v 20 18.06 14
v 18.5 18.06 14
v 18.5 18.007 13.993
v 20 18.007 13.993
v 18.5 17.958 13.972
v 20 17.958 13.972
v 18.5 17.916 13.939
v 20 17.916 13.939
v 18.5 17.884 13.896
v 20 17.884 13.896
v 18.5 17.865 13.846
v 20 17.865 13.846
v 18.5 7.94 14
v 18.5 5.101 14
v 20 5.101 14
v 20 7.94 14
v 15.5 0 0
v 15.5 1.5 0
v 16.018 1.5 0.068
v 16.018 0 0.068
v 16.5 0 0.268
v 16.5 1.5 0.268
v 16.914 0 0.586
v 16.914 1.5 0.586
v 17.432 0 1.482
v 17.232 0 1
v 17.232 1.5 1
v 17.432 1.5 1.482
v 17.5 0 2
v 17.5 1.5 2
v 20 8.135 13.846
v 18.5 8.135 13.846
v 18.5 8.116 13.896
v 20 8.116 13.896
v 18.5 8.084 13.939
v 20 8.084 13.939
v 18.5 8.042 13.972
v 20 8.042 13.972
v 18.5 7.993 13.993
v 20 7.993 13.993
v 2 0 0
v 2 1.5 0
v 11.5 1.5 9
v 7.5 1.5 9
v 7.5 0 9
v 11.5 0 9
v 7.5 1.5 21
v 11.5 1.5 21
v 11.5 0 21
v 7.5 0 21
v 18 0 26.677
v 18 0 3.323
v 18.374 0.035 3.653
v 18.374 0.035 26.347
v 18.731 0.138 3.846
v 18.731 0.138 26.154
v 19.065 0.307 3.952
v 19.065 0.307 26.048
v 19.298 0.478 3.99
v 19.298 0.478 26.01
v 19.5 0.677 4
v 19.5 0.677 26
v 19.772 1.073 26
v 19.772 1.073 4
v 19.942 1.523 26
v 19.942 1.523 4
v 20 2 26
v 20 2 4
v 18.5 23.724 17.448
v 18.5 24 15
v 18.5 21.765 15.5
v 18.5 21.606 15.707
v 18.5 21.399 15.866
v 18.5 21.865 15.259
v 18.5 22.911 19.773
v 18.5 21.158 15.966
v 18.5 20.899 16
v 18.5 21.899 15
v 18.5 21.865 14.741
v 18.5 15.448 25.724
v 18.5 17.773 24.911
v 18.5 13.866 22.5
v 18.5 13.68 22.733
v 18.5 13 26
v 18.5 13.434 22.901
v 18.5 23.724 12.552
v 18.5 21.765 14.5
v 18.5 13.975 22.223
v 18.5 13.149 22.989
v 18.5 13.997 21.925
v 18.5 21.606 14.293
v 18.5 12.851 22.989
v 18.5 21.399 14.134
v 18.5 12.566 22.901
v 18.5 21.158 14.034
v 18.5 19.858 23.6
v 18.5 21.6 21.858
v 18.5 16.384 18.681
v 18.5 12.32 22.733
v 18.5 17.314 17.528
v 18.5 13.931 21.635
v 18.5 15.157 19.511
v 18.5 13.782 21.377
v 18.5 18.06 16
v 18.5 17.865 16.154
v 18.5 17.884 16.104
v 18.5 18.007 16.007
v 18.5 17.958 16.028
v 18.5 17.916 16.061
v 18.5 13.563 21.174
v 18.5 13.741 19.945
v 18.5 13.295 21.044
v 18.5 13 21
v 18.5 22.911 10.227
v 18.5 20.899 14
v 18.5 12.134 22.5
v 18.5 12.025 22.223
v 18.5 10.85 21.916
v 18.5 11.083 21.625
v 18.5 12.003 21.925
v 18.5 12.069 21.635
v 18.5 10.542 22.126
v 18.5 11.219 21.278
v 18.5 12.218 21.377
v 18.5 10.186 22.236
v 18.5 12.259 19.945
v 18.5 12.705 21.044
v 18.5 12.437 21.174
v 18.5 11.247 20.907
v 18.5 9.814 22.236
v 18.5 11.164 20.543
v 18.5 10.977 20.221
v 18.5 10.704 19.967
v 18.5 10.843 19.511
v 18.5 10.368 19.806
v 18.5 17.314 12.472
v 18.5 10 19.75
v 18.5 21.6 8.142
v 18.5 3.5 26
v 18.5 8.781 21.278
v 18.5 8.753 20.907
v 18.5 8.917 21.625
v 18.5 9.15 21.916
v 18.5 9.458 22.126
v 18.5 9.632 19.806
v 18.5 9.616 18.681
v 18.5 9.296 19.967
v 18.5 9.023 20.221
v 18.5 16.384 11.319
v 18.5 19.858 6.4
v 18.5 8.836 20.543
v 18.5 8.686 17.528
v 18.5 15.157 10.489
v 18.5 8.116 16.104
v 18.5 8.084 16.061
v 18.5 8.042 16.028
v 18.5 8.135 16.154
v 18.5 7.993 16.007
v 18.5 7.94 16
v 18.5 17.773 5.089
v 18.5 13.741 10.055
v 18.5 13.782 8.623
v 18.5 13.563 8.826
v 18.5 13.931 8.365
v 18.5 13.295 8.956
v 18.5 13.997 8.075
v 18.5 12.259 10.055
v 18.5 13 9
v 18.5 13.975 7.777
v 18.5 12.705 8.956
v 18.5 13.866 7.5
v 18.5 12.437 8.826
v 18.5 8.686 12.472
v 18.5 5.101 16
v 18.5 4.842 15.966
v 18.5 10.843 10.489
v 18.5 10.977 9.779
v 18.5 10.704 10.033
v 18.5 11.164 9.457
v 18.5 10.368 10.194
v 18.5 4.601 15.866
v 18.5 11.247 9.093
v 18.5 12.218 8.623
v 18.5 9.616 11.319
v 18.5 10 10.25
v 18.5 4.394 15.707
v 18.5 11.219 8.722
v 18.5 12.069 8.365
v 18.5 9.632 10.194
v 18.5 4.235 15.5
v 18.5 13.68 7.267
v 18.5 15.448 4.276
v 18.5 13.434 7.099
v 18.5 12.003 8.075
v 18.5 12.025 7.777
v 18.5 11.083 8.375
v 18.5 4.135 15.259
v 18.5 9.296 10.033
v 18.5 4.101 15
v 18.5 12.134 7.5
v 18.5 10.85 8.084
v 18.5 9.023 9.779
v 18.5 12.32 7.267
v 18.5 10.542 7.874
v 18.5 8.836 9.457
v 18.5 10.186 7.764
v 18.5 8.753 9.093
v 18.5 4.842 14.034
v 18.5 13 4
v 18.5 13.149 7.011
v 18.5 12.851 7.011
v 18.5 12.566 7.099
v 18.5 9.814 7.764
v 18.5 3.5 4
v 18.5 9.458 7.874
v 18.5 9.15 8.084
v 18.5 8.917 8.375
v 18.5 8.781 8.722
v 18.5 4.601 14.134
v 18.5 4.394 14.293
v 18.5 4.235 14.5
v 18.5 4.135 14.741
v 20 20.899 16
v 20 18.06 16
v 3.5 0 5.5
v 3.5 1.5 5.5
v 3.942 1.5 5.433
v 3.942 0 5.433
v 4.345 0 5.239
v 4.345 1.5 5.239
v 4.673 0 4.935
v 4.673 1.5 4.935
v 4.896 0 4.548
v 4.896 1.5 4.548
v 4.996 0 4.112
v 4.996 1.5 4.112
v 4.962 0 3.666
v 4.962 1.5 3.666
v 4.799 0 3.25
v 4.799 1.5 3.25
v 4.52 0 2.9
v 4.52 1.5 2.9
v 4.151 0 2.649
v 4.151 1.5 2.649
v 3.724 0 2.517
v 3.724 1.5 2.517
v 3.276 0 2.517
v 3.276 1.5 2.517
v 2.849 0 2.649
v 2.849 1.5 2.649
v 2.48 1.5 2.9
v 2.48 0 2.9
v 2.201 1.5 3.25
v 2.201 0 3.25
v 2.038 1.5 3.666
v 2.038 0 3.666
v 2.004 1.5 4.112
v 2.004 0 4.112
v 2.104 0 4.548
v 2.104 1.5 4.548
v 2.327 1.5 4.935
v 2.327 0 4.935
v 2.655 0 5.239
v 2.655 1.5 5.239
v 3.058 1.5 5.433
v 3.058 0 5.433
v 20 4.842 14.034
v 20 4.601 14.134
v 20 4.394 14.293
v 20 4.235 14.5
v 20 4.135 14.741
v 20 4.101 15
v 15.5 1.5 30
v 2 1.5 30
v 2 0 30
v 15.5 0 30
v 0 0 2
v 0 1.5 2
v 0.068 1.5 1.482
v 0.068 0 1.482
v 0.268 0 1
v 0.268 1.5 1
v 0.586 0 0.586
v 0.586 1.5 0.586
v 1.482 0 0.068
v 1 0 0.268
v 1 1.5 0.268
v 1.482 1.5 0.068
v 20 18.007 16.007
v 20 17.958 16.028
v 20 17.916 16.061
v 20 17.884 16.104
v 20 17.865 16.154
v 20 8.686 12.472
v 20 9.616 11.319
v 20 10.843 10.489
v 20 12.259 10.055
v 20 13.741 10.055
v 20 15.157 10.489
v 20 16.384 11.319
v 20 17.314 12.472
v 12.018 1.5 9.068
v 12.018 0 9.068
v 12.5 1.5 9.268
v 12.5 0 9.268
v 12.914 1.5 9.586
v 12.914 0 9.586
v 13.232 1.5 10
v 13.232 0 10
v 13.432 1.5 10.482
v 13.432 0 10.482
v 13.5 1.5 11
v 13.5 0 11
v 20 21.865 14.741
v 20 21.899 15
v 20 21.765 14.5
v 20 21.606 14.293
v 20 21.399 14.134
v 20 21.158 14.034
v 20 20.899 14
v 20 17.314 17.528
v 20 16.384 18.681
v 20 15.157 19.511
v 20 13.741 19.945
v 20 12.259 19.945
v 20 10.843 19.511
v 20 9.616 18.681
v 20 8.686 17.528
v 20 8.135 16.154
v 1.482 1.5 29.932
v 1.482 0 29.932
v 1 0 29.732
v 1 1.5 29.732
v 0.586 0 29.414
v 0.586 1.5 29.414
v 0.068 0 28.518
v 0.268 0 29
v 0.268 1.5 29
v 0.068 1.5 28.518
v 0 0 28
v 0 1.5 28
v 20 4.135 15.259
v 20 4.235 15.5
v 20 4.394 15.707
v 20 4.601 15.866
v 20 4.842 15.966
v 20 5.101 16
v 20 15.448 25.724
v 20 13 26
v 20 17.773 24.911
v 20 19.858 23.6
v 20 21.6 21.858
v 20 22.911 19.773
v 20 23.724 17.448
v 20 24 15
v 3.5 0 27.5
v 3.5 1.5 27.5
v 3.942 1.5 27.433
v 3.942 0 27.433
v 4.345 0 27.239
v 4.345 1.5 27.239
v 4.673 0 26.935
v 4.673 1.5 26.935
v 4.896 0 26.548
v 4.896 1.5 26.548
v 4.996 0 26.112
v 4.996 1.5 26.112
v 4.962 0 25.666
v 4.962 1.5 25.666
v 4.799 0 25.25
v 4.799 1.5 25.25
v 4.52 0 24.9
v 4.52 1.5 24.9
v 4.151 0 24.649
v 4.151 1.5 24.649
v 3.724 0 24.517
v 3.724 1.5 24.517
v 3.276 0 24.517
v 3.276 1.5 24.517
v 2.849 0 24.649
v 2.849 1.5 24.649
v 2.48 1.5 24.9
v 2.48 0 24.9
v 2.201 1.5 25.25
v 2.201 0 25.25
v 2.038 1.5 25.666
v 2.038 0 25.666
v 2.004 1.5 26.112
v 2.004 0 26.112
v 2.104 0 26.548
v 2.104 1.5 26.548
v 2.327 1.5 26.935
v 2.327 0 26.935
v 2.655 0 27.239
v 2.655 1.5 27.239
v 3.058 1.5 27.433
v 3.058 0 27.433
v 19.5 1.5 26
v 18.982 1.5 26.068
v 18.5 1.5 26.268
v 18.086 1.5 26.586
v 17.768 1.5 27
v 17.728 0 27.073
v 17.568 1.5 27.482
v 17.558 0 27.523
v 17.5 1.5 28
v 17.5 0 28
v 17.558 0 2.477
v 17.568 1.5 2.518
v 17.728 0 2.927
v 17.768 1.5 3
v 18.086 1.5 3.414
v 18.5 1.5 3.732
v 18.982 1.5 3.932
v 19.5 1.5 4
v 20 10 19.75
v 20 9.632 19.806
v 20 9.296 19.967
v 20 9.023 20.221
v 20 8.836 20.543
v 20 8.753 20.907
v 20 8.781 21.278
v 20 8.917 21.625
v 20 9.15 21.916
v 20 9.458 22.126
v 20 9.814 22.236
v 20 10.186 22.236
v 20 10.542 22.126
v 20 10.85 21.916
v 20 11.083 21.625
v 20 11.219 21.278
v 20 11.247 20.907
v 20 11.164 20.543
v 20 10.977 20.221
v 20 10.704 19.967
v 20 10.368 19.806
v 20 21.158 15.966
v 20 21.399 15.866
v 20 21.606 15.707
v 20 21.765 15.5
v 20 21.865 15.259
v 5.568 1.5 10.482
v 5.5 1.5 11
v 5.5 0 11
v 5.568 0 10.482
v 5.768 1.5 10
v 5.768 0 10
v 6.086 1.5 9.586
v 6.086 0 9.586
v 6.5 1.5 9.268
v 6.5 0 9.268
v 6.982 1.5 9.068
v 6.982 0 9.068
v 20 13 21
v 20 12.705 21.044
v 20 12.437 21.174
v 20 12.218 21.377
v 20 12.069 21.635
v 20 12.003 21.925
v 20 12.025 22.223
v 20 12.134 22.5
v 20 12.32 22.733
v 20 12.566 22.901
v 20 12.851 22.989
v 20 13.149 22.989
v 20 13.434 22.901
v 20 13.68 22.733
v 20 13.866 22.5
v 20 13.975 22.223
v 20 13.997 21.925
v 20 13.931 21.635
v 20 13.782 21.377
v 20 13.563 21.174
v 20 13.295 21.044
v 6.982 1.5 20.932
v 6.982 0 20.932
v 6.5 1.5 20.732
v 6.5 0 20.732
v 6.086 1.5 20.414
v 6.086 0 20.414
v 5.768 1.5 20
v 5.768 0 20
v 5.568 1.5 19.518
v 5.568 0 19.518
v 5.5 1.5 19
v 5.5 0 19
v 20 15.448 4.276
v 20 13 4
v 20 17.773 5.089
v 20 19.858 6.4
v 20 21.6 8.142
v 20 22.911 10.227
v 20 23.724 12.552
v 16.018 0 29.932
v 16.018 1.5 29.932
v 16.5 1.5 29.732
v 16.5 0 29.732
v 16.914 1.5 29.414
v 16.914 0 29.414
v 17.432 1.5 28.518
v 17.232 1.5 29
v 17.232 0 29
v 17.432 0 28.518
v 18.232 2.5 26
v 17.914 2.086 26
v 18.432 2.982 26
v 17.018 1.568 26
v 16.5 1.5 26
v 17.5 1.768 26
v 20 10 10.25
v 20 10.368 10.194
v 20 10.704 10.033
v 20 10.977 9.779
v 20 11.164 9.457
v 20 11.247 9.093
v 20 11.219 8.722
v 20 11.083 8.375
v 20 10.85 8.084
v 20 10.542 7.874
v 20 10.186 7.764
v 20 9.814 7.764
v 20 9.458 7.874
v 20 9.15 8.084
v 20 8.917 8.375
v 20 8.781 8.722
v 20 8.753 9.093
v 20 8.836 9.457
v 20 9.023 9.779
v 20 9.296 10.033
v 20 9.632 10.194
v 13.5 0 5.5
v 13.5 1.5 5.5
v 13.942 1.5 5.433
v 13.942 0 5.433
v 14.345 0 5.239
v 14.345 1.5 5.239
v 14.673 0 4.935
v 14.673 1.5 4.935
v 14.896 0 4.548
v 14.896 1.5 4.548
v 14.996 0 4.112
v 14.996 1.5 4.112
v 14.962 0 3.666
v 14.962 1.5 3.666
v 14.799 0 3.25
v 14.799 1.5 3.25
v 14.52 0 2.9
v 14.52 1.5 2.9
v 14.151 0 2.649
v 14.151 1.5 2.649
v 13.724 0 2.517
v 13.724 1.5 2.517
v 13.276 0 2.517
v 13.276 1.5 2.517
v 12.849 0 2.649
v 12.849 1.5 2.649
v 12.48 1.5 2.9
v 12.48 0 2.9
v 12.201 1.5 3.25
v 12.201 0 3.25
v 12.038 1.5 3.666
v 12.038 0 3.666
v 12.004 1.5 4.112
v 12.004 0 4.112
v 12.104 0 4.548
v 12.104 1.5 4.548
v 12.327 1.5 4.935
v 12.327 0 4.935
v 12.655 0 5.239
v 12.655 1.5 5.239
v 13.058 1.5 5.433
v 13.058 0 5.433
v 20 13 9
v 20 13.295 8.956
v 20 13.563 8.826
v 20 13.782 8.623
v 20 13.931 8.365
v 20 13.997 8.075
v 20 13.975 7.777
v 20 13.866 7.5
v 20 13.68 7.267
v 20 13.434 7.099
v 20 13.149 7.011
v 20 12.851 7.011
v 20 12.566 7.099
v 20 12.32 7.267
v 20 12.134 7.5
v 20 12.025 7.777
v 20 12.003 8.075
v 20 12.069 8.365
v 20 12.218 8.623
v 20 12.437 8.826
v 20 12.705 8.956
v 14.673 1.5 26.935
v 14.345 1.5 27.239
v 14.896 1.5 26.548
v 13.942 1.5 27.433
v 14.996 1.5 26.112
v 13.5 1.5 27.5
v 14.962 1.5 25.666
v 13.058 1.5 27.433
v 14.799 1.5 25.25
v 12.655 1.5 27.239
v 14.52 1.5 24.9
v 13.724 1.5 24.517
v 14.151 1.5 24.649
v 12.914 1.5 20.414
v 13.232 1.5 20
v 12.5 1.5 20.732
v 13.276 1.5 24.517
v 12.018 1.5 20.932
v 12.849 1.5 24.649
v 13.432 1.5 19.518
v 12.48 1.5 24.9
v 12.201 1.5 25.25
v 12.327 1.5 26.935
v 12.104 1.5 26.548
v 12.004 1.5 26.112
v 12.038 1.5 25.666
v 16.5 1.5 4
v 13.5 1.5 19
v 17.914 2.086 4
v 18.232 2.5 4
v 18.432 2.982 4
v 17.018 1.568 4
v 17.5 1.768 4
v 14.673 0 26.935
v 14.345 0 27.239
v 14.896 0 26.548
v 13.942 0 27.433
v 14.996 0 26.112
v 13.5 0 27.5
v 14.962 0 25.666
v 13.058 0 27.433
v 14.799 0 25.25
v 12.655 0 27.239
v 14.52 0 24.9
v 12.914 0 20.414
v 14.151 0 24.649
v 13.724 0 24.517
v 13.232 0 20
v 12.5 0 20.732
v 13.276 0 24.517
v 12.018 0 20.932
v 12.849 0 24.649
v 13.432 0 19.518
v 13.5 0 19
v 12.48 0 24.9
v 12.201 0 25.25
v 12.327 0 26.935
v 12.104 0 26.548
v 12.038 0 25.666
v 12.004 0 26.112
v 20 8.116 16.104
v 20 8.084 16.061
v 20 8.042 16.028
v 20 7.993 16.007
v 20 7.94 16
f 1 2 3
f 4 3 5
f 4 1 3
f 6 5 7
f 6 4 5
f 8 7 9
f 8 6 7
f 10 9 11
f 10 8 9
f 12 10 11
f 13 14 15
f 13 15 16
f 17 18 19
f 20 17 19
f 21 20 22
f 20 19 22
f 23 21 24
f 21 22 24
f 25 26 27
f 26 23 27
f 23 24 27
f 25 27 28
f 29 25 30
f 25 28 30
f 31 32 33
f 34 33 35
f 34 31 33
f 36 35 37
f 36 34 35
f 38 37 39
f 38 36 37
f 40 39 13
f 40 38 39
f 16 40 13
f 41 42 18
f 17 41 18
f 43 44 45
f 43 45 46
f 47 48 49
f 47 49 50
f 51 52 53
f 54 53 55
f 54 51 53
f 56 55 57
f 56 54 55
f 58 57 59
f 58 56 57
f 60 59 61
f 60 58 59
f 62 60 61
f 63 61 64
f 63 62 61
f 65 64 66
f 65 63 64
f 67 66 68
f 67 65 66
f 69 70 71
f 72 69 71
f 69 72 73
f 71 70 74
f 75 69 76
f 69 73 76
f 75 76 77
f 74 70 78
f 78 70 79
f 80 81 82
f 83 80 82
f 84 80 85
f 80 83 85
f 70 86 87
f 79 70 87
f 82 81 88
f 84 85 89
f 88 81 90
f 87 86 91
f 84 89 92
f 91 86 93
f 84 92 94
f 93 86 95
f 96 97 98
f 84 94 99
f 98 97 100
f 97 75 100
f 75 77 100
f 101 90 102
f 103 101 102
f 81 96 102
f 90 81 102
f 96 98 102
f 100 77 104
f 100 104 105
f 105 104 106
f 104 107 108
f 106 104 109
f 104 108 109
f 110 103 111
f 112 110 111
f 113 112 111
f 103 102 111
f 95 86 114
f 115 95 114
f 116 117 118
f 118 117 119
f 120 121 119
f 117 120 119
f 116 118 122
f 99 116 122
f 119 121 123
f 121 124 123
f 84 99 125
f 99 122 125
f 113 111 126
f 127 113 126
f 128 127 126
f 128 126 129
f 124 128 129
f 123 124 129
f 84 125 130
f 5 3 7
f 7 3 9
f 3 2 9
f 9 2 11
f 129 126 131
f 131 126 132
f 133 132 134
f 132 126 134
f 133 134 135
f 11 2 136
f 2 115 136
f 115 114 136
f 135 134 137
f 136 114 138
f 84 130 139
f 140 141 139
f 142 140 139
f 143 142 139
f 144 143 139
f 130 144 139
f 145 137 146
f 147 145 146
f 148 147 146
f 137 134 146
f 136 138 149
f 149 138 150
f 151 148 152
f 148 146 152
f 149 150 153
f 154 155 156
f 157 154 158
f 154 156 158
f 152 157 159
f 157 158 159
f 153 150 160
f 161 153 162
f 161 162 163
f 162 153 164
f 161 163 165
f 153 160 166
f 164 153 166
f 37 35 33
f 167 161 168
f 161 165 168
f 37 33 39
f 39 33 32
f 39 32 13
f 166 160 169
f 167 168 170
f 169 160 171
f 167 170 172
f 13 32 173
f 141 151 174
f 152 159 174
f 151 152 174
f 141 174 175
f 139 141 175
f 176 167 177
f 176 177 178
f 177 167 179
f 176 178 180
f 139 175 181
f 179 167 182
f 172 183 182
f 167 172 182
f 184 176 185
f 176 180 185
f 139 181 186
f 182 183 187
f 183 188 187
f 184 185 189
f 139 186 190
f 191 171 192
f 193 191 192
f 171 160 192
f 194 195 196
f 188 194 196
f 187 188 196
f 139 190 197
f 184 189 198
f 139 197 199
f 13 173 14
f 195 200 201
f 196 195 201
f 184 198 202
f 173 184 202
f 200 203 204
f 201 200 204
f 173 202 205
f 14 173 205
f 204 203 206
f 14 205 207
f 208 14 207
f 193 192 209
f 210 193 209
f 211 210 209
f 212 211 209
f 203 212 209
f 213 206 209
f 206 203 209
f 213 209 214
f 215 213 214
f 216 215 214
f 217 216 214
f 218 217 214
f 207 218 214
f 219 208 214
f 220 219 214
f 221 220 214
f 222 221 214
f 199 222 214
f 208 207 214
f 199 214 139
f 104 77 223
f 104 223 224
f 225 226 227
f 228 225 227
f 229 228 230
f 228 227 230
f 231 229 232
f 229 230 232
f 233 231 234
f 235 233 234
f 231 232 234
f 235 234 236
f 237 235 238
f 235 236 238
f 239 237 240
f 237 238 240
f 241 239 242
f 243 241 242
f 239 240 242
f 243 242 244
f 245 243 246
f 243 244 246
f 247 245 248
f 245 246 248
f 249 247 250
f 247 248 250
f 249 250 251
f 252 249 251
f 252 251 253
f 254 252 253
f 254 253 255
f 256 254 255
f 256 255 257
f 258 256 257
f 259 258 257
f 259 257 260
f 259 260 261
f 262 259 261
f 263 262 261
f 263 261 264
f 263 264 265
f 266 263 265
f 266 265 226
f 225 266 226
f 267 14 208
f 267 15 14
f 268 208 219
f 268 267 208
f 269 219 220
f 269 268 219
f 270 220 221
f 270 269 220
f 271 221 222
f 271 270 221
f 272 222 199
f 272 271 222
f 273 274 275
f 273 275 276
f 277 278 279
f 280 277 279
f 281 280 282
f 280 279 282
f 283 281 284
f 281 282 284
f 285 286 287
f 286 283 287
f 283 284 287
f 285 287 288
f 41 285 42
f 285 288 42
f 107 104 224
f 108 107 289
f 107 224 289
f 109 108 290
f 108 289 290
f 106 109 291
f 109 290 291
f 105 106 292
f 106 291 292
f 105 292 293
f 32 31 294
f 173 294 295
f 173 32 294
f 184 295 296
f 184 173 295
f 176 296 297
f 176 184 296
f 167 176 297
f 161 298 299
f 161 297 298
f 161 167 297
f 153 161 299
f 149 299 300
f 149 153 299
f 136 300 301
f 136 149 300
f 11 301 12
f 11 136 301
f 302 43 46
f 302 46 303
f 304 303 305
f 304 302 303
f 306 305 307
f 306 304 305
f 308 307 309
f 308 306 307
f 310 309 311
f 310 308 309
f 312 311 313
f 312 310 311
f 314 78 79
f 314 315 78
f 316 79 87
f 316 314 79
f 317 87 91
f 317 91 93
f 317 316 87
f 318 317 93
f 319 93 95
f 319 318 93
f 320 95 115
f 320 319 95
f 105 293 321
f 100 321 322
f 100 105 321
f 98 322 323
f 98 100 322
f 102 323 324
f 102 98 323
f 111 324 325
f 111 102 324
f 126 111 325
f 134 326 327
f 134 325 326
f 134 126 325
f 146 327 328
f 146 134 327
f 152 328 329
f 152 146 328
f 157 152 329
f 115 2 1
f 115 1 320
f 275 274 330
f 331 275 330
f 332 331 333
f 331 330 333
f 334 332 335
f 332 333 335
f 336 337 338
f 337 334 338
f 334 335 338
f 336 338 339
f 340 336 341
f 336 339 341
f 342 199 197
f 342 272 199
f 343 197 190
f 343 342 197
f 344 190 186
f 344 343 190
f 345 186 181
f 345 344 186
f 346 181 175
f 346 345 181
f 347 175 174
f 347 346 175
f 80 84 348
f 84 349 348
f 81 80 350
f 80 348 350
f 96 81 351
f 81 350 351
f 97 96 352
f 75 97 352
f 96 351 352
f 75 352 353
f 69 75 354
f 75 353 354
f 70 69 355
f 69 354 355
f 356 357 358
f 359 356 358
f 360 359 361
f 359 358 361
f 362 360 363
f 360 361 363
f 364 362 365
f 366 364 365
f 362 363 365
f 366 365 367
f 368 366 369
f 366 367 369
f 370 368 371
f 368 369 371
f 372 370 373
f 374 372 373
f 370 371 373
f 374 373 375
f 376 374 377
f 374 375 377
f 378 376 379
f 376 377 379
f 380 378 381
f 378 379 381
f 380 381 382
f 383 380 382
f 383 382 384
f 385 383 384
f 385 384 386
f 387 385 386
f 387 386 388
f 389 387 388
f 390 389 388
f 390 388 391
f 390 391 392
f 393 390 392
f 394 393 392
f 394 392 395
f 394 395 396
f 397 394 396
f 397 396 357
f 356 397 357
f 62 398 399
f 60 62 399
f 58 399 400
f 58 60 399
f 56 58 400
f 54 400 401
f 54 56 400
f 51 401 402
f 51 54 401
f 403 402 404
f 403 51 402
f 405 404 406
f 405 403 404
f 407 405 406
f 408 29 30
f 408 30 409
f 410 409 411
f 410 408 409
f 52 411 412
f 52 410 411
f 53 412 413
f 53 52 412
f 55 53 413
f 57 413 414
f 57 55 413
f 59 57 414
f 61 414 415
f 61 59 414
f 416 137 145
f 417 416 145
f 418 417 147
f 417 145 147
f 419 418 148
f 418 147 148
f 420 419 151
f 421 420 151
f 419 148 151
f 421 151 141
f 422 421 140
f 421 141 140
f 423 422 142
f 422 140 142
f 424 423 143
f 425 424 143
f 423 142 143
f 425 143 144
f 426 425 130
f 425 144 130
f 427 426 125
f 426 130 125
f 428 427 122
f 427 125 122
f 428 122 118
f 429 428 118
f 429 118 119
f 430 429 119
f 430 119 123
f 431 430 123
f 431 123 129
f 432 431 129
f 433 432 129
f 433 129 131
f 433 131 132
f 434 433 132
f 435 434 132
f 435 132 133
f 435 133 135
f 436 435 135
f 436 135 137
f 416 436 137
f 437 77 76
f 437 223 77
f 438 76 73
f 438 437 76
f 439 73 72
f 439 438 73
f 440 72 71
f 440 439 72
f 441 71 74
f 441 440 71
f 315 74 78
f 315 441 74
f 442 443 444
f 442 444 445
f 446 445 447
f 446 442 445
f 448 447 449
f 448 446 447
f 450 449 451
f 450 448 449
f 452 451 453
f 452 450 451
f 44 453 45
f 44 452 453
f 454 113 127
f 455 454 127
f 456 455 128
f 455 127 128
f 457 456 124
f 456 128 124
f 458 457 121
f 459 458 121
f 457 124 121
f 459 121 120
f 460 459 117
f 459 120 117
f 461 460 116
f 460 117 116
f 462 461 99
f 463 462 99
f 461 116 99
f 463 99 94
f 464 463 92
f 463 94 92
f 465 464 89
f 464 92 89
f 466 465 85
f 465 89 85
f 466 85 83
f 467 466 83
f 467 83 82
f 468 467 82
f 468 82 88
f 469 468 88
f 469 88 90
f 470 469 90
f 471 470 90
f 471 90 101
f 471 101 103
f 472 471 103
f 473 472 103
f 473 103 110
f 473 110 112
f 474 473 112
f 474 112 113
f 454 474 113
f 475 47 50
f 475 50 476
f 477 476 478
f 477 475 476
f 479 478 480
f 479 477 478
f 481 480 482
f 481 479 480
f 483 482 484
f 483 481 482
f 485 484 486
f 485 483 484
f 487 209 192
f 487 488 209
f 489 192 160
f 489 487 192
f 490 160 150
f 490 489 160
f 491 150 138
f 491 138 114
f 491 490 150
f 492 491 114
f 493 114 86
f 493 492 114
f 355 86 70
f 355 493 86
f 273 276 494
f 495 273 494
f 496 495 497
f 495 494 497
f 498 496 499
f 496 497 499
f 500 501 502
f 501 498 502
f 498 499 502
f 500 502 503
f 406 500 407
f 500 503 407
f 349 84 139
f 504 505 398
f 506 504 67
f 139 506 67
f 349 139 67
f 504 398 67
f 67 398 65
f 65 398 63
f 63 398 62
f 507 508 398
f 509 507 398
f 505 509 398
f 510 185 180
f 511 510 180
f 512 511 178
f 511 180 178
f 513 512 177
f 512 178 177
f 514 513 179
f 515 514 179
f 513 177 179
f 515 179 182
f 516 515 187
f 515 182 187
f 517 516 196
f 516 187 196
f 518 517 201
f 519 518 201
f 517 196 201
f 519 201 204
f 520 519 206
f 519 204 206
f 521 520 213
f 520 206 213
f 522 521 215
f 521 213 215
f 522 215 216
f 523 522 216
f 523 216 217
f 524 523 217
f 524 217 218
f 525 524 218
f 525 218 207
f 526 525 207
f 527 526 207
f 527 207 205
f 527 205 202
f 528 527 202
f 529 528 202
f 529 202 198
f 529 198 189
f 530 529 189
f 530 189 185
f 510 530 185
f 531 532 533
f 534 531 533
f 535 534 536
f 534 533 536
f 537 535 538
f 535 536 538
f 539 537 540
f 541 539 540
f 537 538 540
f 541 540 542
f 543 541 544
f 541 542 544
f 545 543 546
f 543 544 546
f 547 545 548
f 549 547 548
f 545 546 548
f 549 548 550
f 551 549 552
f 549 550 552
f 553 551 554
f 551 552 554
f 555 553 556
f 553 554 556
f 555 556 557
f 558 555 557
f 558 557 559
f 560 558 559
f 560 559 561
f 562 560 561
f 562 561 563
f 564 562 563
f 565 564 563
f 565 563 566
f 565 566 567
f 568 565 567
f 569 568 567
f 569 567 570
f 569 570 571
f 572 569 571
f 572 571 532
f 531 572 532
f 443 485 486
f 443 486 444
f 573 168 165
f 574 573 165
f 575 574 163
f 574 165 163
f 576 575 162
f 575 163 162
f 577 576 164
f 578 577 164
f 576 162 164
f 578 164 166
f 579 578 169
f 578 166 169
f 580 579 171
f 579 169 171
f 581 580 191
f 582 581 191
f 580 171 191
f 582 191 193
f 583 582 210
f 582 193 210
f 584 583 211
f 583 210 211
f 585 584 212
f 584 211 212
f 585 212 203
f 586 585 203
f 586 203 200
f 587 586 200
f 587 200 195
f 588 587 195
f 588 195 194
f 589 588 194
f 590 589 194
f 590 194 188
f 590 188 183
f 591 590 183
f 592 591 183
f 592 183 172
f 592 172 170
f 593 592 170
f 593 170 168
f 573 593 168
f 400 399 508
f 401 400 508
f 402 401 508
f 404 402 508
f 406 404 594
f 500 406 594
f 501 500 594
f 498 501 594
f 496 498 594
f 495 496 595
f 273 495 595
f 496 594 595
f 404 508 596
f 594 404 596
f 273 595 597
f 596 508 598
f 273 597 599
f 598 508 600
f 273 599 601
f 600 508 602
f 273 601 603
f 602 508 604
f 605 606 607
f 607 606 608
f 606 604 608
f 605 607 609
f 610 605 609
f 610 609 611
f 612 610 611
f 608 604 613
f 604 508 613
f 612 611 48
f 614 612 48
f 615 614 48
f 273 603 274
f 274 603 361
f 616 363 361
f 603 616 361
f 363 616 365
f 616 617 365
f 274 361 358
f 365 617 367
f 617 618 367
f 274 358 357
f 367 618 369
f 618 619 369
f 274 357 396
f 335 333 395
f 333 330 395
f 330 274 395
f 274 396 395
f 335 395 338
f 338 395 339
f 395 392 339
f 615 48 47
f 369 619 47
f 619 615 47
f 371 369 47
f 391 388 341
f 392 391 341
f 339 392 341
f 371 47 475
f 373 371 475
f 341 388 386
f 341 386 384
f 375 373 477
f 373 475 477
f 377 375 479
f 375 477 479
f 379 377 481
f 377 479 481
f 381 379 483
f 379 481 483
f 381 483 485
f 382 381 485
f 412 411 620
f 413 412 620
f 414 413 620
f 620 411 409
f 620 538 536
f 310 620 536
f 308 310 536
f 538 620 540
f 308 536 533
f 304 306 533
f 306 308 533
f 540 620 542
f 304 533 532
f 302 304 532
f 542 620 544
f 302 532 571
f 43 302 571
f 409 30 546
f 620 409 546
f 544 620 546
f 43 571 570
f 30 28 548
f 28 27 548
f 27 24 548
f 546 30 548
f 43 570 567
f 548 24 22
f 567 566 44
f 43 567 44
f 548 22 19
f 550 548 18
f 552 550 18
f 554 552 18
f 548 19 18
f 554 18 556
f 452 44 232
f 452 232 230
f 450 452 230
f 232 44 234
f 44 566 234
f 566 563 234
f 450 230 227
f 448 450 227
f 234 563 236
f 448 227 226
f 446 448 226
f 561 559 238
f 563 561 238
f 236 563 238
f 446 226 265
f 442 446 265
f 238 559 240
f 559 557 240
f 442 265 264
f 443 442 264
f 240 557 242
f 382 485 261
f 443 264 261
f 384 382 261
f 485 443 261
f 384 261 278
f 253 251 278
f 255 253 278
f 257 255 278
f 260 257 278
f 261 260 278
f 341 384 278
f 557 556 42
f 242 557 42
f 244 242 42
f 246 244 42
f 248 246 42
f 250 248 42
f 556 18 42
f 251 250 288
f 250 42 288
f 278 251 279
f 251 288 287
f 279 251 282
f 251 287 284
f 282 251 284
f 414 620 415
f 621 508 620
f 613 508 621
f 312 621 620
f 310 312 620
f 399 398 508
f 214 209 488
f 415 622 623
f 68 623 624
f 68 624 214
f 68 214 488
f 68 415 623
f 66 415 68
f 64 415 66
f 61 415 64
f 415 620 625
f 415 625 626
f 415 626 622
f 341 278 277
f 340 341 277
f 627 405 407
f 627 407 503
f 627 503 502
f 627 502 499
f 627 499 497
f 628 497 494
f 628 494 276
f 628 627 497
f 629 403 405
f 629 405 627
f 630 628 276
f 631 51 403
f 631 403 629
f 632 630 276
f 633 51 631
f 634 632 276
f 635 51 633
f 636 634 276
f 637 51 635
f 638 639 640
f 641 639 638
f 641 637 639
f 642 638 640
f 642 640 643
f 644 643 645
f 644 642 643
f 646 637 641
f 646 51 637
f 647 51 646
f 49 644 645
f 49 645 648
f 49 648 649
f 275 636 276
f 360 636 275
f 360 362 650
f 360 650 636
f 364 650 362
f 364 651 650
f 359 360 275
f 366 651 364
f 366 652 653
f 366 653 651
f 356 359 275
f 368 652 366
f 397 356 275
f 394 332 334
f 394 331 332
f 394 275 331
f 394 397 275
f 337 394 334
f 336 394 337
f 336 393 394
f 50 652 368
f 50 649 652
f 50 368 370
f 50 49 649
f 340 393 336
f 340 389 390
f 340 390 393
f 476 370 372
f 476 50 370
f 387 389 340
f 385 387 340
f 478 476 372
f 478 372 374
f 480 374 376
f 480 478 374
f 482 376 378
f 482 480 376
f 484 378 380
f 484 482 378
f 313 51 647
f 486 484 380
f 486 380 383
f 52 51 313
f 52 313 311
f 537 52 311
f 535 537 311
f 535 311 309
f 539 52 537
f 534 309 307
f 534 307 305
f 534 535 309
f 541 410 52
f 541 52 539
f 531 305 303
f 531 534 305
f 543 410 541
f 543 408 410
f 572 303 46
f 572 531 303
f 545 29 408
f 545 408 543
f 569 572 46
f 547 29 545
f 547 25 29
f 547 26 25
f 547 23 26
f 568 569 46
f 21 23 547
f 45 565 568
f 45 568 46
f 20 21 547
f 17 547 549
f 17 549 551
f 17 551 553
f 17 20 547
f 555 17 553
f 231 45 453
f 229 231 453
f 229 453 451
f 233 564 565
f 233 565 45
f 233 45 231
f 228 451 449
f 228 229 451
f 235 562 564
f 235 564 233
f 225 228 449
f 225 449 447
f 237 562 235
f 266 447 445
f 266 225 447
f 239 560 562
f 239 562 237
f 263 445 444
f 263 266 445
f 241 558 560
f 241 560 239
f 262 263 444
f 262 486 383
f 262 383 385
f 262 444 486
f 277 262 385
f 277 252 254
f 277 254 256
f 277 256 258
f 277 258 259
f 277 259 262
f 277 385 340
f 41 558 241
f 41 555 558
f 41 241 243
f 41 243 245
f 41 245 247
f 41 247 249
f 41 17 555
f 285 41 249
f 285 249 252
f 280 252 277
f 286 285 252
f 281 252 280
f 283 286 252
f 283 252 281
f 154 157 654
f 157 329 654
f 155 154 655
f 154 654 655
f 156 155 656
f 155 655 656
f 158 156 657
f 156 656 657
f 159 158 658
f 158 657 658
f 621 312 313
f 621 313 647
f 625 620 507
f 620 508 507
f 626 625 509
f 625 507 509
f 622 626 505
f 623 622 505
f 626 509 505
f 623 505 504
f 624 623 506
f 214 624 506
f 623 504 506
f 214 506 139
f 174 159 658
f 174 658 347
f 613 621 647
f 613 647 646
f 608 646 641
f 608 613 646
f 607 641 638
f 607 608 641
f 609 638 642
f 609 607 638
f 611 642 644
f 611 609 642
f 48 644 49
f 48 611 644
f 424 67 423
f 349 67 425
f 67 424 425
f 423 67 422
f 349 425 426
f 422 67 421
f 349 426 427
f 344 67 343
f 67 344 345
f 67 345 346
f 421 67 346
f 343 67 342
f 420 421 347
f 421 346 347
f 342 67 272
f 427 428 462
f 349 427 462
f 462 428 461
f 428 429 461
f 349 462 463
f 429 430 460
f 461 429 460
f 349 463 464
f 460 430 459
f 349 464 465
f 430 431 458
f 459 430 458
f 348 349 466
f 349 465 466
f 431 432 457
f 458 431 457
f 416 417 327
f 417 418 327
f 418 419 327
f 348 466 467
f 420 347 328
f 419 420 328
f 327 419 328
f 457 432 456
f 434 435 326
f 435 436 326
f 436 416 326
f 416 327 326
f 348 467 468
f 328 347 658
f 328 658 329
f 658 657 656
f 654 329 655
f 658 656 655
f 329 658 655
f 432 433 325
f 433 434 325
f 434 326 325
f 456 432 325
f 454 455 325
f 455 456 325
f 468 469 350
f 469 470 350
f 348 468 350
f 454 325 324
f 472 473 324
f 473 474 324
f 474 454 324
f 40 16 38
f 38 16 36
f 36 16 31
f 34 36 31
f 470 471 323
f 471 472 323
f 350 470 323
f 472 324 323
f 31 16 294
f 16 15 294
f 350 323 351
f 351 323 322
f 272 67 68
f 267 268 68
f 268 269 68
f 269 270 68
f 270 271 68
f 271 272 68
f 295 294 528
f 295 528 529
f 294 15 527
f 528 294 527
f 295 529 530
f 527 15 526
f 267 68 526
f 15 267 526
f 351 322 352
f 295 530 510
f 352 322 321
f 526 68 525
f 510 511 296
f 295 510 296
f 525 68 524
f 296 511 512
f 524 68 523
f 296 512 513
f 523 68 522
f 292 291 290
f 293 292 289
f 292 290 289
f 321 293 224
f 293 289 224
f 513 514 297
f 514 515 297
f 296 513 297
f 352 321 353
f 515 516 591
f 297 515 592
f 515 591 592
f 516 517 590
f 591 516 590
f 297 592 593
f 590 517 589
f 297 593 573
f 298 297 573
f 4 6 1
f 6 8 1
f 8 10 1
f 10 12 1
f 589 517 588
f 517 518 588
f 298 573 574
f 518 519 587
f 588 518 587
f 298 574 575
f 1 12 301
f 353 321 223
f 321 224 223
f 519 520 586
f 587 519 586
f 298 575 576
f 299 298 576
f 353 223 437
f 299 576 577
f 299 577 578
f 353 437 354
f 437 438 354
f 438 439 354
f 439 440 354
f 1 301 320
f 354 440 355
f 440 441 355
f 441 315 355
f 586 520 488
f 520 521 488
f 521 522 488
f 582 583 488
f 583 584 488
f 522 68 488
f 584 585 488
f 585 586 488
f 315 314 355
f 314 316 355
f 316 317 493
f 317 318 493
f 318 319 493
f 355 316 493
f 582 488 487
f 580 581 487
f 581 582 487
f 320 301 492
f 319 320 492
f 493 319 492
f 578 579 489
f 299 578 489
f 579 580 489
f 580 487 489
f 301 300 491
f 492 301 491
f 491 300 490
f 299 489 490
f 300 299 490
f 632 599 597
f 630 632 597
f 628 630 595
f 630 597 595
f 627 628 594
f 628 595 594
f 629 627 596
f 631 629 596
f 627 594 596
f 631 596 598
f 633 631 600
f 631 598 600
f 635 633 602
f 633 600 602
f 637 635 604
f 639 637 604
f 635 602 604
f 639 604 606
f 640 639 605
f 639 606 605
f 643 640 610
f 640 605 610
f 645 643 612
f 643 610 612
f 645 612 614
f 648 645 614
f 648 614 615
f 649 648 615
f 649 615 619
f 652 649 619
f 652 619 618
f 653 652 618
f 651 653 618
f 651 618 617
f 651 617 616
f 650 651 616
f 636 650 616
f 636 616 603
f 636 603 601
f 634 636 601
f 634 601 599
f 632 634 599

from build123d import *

# Parameters (mm, degrees)
EXTRUDE_1_DEPTH          = 30
CUT_EXTRUDE_1_DEPTH      = 30
CUT_EXTRUDE_1_DEPTH_BACK = 30
SKETCH_2_W               = 4.827470223
SKETCH_2_H               = 5.659354242
FILLET_1_R               = 11
SKETCH_3_R               = 1.5
CUT_EXTRUDE_2_DEPTH      = 30
SKETCH_4_R               = 1
SKETCH_4_R_2             = 1.25
CUT_EXTRUDE_3_DEPTH      = 43.640942766
FILLET_2_R               = 1
FILLET_3_R               = 0.2
FILLET_4_R               = 2
FILLET_5_R               = 2


# Some blends are built 0.0001 mm under size
with BuildPart() as part:
    # 草图1 → 凸台-拉伸1 (new body)
    with BuildSketch(Plane.XY):
        Polygon((0, 0), (18.5, 0), (20, 0), (20, 24), (18.5, 24), (18.5, 1.5), (0, 1.5), align=None)
    extrude(amount=EXTRUDE_1_DEPTH)

    # 草图2 → 切除-拉伸1 (cut, two sides: drawn at the far end of the back side and taken through both)
    with BuildSketch(Plane(origin=(0, 1.5, 0), x_dir=(1, 0, 0), z_dir=(0, 1, 0)).offset(-CUT_EXTRUDE_1_DEPTH_BACK)):
        with Locations((19.913735112, -1.170322879)):
            Rectangle(SKETCH_2_W, SKETCH_2_H)
        with Locations((19.913735112, -28.829677121)):
            Rectangle(SKETCH_2_W, SKETCH_2_H)
    extrude(amount=CUT_EXTRUDE_1_DEPTH + CUT_EXTRUDE_1_DEPTH_BACK, mode=Mode.SUBTRACT)

    # 圆角1
    fillet_1_edges = [part.edges().sort_by_distance(p)[0] for p in [
        (19.25, 24, 26),
        (19.25, 24, 4),
    ]]
    fillet(fillet_1_edges, radius=FILLET_1_R - 0.0001)  # a hair under: the kernel refuses the full size

    # 草图3 → 切除-拉伸2 (cut)
    with BuildSketch(Plane(origin=(0, 1.5, 0), x_dir=(1, 0, 0), z_dir=(0, 1, 0))):
        with Locations(Location((13.5, -4, 0), (0, 0, 270))):
            Circle(SKETCH_3_R)
        with Locations(Location((3.5, -4, 0), (0, 0, 270))):
            Circle(SKETCH_3_R)
        with Locations(Location((3.5, -26, 0), (0, 0, 270))):
            Circle(SKETCH_3_R)
        with Locations(Location((13.5, -26, 0), (0, 0, 270))):
            Circle(SKETCH_3_R)
        with BuildLine():
            Line((7.5, -9), (11.5, -9))
            ThreePointArc((11.5, -9), (12.914213562, -9.585786438), (13.5, -11))
            Line((13.5, -11), (13.5, -19))
            ThreePointArc((13.5, -19), (12.914213562, -20.414213562), (11.5, -21))
            Line((11.5, -21), (7.5, -21))
            ThreePointArc((7.5, -21), (6.085786438, -20.414213562), (5.5, -19))
            Line((5.5, -19), (5.5, -11))
            ThreePointArc((5.5, -11), (6.085786438, -9.585786438), (7.5, -9))
        make_face()
    extrude(amount=-CUT_EXTRUDE_2_DEPTH, mode=Mode.SUBTRACT)

    # 草图4 → 切除-拉伸3 (cut, through all)
    with BuildSketch(Plane.ZY.offset(-18.5)):
        with Locations((8, 13)):
            Circle(SKETCH_4_R)
        with Locations(Location((22, 13, 0), (0, 0, 180))):
            Circle(SKETCH_4_R)
        with Locations((9, 10)):
            Circle(SKETCH_4_R_2)
        with Locations(Location((21, 10, 0), (0, 0, 180))):
            Circle(SKETCH_4_R_2)
        with BuildLine():
            Line((16, 8.101020514), (16, 4.101020514))
            Line((16, 4.101020514), (14, 4.101020514))
            Line((14, 4.101020514), (14, 8.101020514))
            ThreePointArc((14, 8.101020514), (10, 13), (14, 17.898979486))
            Line((14, 17.898979486), (14, 21.898979486))
            Line((14, 21.898979486), (16, 21.898979486))
            Line((16, 21.898979486), (16, 17.898979486))
            ThreePointArc((16, 17.898979486), (20, 13), (16, 8.101020514))
        make_face()
    extrude(amount=-CUT_EXTRUDE_3_DEPTH, mode=Mode.SUBTRACT)

    # 圆角2
    fillet_2_edges = [part.edges().sort_by_distance(p)[0] for p in [
        (19.25, 4.101020514, 14),
        (19.25, 4.101020514, 16),
        (19.25, 21.898979486, 16),
        (19.25, 21.898979486, 14),
    ]]
    fillet(fillet_2_edges, radius=FILLET_2_R - 0.0001)  # a hair under: the kernel refuses the full size

    # 圆角3
    fillet_3_edges = [part.edges().sort_by_distance(p)[0] for p in [
        (19.25, 8.101020514, 14),
        (19.25, 17.898979486, 14),
        (19.25, 17.898979486, 16),
        (19.25, 8.101020514, 16),
    ]]
    fillet(fillet_3_edges, radius=FILLET_3_R)

    # 圆角4
    # the kernel refuses this fillet: 2 mm, written as the material it adds along each edge
    with BuildSketch(Plane(origin=(17.5, 0, 26), x_dir=(1, 0, 0), z_dir=(0, 1, 0))) as fillet_4_piece_1:
        with BuildLine():
            CenterArc((FILLET_4_R, -FILLET_4_R), FILLET_4_R, 90, 90)
            Line((0, -FILLET_4_R), (0, 0))
            Line((0, 0), (FILLET_4_R, 0))
        make_face()
    extrude(amount=1.5)
    with BuildSketch(Plane(origin=(17.5, 0, 4), x_dir=(1, 0, 0), z_dir=(0, 1, 0))) as fillet_4_piece_2:
        with BuildLine():
            CenterArc((FILLET_4_R, FILLET_4_R), FILLET_4_R, 180, 90)
            Line((0, FILLET_4_R), (0, 0))
            Line((0, 0), (FILLET_4_R, 0))
        make_face()
    extrude(amount=1.5)
    # the kernel refuses this fillet: 2 mm, written as the material it takes off along each edge
    with BuildSketch(Plane(origin=(17.5, 6.5, 0), x_dir=(0, 0, 1), z_dir=(0, -1, 0)), Plane(origin=(17.5, -5, 30), x_dir=(0, 0, -1), z_dir=(0, 1, 0)), Plane(origin=(0, 6.5, 30), x_dir=(0, 0, -1), z_dir=(0, -1, 0)), Plane(origin=(0, 6.5, 0), x_dir=(1, 0, 0), z_dir=(0, -1, 0))) as fillet_4_2_piece_1:
        with BuildLine():
            CenterArc((FILLET_4_R, FILLET_4_R), FILLET_4_R, 180, 90)
            Line((0, FILLET_4_R), (0, 0))
            Line((0, 0), (FILLET_4_R, 0))
        make_face()
    extrude(amount=11.5, mode=Mode.SUBTRACT)

    # 圆角5
    fillet_5_edges = [part.edges().sort_by_distance(p)[0] for p in [
        (20, 0, 15),
        (18.5, 1.5, 15),
    ]]
    fillet(fillet_5_edges, radius=FILLET_5_R)


solid = part.part
